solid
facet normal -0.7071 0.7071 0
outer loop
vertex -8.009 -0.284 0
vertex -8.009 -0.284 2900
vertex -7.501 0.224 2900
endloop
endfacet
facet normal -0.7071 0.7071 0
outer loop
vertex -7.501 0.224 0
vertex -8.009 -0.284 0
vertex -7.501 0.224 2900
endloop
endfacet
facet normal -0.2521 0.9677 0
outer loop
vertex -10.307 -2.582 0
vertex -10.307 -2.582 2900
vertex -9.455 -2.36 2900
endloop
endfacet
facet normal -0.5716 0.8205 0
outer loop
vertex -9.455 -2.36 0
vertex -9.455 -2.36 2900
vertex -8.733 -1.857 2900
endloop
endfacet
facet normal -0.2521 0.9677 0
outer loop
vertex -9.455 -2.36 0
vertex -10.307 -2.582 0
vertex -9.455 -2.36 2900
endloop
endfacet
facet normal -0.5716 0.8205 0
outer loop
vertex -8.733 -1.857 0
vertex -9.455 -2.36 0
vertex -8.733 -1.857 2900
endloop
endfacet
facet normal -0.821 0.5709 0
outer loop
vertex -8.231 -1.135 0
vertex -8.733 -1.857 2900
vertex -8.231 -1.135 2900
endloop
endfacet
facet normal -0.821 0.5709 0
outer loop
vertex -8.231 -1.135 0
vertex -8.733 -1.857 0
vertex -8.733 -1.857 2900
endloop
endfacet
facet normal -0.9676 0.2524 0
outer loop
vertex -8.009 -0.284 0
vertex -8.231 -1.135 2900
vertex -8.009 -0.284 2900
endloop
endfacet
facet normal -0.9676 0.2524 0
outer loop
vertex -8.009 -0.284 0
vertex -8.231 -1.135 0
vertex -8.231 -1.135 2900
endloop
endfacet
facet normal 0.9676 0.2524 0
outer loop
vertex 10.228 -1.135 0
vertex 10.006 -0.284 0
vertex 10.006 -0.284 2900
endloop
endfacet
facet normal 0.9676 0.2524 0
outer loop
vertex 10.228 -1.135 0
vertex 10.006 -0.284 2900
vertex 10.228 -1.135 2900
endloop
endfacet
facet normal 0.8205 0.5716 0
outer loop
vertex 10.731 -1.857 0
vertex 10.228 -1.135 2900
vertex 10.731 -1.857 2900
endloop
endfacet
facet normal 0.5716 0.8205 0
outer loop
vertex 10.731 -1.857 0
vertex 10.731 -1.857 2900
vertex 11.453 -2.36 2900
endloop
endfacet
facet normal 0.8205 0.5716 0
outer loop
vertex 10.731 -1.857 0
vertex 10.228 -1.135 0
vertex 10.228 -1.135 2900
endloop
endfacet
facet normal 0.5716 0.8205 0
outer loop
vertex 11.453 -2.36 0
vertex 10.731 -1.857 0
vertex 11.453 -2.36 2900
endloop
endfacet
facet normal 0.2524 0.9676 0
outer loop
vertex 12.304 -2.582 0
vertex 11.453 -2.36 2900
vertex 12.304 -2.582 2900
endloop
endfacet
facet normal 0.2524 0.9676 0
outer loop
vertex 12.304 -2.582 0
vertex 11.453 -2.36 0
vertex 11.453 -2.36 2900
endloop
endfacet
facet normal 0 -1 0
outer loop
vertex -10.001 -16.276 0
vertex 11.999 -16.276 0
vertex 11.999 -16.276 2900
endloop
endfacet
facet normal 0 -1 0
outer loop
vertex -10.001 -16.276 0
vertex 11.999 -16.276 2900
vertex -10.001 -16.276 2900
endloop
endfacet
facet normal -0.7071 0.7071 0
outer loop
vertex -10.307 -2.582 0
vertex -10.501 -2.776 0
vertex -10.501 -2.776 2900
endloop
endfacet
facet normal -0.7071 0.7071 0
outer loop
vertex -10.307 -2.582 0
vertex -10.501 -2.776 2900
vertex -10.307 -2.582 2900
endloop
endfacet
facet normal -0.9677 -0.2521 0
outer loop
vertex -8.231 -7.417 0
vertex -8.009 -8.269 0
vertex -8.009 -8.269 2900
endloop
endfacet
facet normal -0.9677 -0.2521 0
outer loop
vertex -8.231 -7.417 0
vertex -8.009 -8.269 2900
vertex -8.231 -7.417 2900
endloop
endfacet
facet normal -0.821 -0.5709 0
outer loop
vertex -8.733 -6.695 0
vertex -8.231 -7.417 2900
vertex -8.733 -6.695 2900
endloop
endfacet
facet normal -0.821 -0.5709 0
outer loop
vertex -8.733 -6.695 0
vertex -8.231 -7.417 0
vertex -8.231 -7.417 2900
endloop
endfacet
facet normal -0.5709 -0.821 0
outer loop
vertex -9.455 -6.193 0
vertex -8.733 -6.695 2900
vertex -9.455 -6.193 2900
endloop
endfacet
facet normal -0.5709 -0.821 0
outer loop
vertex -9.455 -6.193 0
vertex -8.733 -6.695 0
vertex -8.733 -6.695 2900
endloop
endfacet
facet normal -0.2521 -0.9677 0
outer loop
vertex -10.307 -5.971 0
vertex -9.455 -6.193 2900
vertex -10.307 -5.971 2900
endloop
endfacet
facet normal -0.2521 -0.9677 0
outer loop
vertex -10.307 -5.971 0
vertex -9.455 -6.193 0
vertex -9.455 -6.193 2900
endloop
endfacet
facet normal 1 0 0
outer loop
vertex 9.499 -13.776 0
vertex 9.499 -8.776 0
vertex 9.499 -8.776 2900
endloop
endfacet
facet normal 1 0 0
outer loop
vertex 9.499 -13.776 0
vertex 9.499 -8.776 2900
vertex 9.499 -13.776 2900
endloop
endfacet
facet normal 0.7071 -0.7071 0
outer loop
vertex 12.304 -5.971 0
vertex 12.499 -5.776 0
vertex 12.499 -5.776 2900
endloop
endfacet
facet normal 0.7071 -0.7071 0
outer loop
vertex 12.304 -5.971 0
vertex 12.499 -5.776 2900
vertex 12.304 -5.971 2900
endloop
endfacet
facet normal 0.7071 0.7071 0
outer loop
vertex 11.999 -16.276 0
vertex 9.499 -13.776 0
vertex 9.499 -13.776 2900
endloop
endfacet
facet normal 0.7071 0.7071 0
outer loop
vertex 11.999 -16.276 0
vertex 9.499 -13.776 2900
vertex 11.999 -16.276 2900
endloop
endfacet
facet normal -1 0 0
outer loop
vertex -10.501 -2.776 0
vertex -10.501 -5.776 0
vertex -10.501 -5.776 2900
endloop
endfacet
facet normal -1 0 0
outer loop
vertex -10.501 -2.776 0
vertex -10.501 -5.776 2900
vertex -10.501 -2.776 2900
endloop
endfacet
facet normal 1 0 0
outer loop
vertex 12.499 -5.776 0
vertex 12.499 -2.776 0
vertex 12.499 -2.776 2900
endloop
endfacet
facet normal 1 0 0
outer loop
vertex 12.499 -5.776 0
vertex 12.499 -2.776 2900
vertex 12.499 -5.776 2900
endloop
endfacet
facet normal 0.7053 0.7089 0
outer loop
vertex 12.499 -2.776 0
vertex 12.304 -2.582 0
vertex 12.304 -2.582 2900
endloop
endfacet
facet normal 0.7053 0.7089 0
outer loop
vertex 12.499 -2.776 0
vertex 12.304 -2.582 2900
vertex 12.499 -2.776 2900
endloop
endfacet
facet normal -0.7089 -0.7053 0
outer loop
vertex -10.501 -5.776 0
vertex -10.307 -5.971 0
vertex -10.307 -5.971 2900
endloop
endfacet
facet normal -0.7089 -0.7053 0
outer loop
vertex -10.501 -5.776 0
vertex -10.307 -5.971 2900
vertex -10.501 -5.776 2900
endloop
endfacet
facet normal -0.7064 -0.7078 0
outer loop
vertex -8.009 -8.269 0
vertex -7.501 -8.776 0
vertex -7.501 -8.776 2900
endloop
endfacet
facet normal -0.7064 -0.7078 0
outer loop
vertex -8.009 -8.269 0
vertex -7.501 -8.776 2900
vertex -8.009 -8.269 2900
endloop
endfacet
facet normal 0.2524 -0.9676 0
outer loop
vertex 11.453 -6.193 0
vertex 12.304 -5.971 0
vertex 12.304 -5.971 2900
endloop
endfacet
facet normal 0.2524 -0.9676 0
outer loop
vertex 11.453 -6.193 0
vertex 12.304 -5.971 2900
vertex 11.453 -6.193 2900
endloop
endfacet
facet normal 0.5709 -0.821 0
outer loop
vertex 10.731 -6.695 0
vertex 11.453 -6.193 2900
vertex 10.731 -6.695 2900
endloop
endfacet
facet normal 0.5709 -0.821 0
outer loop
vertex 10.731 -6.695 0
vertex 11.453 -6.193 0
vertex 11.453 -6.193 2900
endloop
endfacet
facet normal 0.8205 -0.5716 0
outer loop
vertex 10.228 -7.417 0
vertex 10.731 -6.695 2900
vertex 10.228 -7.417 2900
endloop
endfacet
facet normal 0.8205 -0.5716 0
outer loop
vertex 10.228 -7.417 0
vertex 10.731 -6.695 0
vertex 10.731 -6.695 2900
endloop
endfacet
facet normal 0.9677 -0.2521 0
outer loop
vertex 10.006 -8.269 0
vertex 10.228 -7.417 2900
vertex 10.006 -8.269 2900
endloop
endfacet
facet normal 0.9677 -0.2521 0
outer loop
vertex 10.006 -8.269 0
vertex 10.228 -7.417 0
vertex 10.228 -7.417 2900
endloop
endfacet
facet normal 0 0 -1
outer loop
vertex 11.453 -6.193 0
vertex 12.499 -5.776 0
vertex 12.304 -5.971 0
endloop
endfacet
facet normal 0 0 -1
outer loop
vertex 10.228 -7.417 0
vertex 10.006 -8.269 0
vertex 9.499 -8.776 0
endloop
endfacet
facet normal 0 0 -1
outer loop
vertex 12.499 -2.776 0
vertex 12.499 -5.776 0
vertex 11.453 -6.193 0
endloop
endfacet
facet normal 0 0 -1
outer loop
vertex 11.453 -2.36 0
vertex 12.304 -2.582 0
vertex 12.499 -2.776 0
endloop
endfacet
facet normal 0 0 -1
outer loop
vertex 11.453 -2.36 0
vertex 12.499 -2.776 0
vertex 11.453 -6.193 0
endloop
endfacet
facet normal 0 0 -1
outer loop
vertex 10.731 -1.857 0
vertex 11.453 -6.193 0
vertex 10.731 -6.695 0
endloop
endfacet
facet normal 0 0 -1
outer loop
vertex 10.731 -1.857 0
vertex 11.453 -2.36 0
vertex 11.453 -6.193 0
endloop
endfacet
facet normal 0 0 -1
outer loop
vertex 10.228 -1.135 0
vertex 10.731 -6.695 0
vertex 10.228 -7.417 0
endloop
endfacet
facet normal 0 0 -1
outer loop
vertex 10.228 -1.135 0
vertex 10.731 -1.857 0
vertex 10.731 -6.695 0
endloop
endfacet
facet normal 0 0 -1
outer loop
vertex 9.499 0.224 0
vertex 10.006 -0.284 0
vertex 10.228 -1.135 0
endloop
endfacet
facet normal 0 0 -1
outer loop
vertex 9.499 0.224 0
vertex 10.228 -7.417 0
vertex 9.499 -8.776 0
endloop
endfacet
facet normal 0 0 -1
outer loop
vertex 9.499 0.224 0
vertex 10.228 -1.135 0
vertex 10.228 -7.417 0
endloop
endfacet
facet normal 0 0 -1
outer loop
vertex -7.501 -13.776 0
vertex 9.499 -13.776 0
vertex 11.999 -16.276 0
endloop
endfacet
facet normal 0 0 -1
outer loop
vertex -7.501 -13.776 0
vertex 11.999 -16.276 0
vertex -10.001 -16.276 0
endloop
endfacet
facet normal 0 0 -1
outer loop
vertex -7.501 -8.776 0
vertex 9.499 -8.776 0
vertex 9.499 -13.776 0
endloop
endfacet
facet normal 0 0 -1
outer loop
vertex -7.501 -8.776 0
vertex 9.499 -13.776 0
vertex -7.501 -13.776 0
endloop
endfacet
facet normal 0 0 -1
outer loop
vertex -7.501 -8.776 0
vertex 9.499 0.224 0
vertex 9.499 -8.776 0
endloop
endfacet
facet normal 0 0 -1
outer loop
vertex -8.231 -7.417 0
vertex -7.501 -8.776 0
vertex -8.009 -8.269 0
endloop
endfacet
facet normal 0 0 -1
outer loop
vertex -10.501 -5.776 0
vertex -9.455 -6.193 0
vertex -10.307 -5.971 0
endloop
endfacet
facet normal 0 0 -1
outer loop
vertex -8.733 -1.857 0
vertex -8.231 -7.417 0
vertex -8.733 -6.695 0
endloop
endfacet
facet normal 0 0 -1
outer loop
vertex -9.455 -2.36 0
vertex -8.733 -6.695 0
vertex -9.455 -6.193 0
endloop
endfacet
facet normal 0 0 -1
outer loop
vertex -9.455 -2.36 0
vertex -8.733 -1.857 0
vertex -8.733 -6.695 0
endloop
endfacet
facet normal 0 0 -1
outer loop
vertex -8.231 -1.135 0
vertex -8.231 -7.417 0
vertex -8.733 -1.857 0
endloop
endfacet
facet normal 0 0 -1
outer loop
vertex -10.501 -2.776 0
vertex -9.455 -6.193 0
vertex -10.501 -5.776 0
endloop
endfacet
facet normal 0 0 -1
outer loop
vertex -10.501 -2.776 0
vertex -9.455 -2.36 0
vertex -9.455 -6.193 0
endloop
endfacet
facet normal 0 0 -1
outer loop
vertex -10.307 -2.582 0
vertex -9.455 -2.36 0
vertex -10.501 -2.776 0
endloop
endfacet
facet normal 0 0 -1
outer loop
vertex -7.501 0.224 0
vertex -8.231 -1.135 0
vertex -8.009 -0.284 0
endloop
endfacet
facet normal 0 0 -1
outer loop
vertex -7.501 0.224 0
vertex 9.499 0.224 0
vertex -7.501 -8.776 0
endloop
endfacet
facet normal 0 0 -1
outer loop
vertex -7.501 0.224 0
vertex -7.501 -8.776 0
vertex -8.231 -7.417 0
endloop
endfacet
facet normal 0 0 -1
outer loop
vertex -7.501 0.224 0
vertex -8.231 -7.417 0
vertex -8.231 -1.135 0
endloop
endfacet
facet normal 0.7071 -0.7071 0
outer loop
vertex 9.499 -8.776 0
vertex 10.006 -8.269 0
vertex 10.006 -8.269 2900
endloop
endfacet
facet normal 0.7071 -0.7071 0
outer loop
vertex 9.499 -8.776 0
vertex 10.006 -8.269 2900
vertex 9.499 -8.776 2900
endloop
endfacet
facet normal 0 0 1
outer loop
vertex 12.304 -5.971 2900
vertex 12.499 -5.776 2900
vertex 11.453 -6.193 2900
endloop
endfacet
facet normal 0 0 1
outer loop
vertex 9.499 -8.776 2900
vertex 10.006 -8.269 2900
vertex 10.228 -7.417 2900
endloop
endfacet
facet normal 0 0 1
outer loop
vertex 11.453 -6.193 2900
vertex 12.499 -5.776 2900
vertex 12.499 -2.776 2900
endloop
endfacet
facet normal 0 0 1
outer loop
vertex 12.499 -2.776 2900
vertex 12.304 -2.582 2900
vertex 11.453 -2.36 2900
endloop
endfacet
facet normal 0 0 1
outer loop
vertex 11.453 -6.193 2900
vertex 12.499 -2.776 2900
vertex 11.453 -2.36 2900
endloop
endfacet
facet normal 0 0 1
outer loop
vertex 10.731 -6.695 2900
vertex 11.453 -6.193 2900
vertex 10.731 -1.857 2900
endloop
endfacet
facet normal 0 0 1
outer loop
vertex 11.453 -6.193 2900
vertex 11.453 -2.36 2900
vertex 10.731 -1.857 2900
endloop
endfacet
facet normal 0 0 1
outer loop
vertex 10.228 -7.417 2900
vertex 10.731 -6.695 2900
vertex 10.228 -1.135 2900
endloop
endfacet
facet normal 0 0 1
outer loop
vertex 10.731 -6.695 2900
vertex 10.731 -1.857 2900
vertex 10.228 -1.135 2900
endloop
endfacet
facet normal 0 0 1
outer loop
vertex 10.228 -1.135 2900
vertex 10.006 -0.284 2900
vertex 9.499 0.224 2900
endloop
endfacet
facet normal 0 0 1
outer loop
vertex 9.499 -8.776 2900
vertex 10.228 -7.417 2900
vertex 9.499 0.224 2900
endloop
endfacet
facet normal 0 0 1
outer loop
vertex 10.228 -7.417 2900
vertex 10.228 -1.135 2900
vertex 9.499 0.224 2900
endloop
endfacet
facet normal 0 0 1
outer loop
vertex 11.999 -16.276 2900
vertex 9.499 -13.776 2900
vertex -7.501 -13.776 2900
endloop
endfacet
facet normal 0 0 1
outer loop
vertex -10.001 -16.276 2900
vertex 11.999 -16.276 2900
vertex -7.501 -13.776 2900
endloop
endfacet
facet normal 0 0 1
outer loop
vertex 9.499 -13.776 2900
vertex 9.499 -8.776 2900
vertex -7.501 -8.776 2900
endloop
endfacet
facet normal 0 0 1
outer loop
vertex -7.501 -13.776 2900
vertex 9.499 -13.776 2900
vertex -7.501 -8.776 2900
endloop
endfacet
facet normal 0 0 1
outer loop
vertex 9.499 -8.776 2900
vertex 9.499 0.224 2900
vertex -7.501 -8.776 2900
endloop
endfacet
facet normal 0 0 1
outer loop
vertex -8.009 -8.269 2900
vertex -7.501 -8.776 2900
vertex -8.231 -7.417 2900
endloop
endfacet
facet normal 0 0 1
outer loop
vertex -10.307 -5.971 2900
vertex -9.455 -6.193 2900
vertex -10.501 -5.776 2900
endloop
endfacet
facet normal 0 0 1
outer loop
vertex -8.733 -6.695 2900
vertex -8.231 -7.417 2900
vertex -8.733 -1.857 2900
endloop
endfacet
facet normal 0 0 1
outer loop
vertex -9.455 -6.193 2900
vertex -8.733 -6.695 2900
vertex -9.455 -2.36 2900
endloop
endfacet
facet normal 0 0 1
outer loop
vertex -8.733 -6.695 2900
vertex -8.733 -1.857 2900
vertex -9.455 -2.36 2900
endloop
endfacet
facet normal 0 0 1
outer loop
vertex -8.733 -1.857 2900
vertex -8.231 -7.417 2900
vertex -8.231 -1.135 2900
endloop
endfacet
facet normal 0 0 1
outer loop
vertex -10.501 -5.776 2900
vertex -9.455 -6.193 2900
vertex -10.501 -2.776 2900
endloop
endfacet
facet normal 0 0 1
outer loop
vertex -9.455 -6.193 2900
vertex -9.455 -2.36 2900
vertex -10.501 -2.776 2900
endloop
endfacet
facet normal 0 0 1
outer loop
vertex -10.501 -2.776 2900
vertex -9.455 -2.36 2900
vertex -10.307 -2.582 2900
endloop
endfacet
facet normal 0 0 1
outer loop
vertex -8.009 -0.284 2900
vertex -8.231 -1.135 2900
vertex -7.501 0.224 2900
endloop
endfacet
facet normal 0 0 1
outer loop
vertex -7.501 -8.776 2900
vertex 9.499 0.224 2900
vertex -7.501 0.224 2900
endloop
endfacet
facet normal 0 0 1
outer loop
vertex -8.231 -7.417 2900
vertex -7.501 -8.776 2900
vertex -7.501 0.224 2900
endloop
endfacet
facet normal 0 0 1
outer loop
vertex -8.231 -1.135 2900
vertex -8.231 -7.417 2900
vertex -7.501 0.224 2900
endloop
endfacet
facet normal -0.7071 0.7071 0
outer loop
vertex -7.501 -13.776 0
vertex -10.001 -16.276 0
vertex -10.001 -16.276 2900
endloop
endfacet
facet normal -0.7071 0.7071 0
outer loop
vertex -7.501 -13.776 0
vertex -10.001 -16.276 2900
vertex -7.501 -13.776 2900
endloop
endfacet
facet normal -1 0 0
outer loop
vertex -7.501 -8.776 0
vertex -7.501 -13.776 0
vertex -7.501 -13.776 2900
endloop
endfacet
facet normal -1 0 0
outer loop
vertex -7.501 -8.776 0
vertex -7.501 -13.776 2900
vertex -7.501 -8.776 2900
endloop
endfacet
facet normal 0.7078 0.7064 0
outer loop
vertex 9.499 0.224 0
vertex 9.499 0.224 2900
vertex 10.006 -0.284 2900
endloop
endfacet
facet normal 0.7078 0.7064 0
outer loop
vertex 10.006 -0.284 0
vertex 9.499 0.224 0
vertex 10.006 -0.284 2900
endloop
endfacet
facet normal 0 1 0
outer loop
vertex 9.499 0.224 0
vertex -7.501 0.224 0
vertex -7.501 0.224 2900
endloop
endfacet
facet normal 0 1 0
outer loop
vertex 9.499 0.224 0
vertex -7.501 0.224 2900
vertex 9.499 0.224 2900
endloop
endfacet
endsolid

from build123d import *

# Parameters (mm, degrees)
ESTRUSIONE_ESTRUSIONE1_DEPTH = 2900


with BuildPart() as part:
    # Schizzo1 → Estrusione-Estrusione1 (new body)
    with BuildSketch(Plane.XY):
        with BuildLine():
            ThreePointArc((12.304198043, -5.970812526), (10.731021445, -6.695460987), (10.006372984, -8.268637585))
            Line((10.006372984, -8.268637585), (9.498788398, -8.776222172))
            Line((9.498788398, -8.776222172), (9.498788398, -13.776222172))
            Line((9.498788398, -13.776222172), (11.998788398, -16.276222172))
            Line((11.998788398, -16.276222172), (-10.001211602, -16.276222172))
            Line((-10.001211602, -16.276222172), (-7.501211602, -13.776222172))
            Line((-7.501211602, -13.776222172), (-7.501211602, -8.776222172))
            Line((-7.501211602, -8.776222172), (-8.008796188, -8.268637585))
            ThreePointArc((-8.008796188, -8.268637585), (-8.733444649, -6.695460987), (-10.306621247, -5.970812526))
            Line((-10.306621247, -5.970812526), (-10.501211602, -5.776222172))
            Line((-10.501211602, -5.776222172), (-10.501211602, -2.776222172))
            Line((-10.501211602, -2.776222172), (-10.306621247, -2.581631817))
            ThreePointArc((-10.306621247, -2.581631817), (-8.733444649, -1.856983356), (-8.008796188, -0.283806758))
            Line((-8.008796188, -0.283806758), (-7.501211602, 0.223777828))
            Line((-7.501211602, 0.223777828), (9.498788398, 0.223777828))
            Line((9.498788398, 0.223777828), (10.006372984, -0.283806758))
            ThreePointArc((10.006372984, -0.283806758), (10.731021445, -1.856983356), (12.304198043, -2.581631817))
            Line((12.304198043, -2.581631817), (12.498788398, -2.776222172))
            Line((12.498788398, -2.776222172), (12.498788398, -5.776222172))
            Line((12.498788398, -5.776222172), (12.304198043, -5.970812526))
        make_face()
    extrude(amount=ESTRUSIONE_ESTRUSIONE1_DEPTH)


solid = part.part
